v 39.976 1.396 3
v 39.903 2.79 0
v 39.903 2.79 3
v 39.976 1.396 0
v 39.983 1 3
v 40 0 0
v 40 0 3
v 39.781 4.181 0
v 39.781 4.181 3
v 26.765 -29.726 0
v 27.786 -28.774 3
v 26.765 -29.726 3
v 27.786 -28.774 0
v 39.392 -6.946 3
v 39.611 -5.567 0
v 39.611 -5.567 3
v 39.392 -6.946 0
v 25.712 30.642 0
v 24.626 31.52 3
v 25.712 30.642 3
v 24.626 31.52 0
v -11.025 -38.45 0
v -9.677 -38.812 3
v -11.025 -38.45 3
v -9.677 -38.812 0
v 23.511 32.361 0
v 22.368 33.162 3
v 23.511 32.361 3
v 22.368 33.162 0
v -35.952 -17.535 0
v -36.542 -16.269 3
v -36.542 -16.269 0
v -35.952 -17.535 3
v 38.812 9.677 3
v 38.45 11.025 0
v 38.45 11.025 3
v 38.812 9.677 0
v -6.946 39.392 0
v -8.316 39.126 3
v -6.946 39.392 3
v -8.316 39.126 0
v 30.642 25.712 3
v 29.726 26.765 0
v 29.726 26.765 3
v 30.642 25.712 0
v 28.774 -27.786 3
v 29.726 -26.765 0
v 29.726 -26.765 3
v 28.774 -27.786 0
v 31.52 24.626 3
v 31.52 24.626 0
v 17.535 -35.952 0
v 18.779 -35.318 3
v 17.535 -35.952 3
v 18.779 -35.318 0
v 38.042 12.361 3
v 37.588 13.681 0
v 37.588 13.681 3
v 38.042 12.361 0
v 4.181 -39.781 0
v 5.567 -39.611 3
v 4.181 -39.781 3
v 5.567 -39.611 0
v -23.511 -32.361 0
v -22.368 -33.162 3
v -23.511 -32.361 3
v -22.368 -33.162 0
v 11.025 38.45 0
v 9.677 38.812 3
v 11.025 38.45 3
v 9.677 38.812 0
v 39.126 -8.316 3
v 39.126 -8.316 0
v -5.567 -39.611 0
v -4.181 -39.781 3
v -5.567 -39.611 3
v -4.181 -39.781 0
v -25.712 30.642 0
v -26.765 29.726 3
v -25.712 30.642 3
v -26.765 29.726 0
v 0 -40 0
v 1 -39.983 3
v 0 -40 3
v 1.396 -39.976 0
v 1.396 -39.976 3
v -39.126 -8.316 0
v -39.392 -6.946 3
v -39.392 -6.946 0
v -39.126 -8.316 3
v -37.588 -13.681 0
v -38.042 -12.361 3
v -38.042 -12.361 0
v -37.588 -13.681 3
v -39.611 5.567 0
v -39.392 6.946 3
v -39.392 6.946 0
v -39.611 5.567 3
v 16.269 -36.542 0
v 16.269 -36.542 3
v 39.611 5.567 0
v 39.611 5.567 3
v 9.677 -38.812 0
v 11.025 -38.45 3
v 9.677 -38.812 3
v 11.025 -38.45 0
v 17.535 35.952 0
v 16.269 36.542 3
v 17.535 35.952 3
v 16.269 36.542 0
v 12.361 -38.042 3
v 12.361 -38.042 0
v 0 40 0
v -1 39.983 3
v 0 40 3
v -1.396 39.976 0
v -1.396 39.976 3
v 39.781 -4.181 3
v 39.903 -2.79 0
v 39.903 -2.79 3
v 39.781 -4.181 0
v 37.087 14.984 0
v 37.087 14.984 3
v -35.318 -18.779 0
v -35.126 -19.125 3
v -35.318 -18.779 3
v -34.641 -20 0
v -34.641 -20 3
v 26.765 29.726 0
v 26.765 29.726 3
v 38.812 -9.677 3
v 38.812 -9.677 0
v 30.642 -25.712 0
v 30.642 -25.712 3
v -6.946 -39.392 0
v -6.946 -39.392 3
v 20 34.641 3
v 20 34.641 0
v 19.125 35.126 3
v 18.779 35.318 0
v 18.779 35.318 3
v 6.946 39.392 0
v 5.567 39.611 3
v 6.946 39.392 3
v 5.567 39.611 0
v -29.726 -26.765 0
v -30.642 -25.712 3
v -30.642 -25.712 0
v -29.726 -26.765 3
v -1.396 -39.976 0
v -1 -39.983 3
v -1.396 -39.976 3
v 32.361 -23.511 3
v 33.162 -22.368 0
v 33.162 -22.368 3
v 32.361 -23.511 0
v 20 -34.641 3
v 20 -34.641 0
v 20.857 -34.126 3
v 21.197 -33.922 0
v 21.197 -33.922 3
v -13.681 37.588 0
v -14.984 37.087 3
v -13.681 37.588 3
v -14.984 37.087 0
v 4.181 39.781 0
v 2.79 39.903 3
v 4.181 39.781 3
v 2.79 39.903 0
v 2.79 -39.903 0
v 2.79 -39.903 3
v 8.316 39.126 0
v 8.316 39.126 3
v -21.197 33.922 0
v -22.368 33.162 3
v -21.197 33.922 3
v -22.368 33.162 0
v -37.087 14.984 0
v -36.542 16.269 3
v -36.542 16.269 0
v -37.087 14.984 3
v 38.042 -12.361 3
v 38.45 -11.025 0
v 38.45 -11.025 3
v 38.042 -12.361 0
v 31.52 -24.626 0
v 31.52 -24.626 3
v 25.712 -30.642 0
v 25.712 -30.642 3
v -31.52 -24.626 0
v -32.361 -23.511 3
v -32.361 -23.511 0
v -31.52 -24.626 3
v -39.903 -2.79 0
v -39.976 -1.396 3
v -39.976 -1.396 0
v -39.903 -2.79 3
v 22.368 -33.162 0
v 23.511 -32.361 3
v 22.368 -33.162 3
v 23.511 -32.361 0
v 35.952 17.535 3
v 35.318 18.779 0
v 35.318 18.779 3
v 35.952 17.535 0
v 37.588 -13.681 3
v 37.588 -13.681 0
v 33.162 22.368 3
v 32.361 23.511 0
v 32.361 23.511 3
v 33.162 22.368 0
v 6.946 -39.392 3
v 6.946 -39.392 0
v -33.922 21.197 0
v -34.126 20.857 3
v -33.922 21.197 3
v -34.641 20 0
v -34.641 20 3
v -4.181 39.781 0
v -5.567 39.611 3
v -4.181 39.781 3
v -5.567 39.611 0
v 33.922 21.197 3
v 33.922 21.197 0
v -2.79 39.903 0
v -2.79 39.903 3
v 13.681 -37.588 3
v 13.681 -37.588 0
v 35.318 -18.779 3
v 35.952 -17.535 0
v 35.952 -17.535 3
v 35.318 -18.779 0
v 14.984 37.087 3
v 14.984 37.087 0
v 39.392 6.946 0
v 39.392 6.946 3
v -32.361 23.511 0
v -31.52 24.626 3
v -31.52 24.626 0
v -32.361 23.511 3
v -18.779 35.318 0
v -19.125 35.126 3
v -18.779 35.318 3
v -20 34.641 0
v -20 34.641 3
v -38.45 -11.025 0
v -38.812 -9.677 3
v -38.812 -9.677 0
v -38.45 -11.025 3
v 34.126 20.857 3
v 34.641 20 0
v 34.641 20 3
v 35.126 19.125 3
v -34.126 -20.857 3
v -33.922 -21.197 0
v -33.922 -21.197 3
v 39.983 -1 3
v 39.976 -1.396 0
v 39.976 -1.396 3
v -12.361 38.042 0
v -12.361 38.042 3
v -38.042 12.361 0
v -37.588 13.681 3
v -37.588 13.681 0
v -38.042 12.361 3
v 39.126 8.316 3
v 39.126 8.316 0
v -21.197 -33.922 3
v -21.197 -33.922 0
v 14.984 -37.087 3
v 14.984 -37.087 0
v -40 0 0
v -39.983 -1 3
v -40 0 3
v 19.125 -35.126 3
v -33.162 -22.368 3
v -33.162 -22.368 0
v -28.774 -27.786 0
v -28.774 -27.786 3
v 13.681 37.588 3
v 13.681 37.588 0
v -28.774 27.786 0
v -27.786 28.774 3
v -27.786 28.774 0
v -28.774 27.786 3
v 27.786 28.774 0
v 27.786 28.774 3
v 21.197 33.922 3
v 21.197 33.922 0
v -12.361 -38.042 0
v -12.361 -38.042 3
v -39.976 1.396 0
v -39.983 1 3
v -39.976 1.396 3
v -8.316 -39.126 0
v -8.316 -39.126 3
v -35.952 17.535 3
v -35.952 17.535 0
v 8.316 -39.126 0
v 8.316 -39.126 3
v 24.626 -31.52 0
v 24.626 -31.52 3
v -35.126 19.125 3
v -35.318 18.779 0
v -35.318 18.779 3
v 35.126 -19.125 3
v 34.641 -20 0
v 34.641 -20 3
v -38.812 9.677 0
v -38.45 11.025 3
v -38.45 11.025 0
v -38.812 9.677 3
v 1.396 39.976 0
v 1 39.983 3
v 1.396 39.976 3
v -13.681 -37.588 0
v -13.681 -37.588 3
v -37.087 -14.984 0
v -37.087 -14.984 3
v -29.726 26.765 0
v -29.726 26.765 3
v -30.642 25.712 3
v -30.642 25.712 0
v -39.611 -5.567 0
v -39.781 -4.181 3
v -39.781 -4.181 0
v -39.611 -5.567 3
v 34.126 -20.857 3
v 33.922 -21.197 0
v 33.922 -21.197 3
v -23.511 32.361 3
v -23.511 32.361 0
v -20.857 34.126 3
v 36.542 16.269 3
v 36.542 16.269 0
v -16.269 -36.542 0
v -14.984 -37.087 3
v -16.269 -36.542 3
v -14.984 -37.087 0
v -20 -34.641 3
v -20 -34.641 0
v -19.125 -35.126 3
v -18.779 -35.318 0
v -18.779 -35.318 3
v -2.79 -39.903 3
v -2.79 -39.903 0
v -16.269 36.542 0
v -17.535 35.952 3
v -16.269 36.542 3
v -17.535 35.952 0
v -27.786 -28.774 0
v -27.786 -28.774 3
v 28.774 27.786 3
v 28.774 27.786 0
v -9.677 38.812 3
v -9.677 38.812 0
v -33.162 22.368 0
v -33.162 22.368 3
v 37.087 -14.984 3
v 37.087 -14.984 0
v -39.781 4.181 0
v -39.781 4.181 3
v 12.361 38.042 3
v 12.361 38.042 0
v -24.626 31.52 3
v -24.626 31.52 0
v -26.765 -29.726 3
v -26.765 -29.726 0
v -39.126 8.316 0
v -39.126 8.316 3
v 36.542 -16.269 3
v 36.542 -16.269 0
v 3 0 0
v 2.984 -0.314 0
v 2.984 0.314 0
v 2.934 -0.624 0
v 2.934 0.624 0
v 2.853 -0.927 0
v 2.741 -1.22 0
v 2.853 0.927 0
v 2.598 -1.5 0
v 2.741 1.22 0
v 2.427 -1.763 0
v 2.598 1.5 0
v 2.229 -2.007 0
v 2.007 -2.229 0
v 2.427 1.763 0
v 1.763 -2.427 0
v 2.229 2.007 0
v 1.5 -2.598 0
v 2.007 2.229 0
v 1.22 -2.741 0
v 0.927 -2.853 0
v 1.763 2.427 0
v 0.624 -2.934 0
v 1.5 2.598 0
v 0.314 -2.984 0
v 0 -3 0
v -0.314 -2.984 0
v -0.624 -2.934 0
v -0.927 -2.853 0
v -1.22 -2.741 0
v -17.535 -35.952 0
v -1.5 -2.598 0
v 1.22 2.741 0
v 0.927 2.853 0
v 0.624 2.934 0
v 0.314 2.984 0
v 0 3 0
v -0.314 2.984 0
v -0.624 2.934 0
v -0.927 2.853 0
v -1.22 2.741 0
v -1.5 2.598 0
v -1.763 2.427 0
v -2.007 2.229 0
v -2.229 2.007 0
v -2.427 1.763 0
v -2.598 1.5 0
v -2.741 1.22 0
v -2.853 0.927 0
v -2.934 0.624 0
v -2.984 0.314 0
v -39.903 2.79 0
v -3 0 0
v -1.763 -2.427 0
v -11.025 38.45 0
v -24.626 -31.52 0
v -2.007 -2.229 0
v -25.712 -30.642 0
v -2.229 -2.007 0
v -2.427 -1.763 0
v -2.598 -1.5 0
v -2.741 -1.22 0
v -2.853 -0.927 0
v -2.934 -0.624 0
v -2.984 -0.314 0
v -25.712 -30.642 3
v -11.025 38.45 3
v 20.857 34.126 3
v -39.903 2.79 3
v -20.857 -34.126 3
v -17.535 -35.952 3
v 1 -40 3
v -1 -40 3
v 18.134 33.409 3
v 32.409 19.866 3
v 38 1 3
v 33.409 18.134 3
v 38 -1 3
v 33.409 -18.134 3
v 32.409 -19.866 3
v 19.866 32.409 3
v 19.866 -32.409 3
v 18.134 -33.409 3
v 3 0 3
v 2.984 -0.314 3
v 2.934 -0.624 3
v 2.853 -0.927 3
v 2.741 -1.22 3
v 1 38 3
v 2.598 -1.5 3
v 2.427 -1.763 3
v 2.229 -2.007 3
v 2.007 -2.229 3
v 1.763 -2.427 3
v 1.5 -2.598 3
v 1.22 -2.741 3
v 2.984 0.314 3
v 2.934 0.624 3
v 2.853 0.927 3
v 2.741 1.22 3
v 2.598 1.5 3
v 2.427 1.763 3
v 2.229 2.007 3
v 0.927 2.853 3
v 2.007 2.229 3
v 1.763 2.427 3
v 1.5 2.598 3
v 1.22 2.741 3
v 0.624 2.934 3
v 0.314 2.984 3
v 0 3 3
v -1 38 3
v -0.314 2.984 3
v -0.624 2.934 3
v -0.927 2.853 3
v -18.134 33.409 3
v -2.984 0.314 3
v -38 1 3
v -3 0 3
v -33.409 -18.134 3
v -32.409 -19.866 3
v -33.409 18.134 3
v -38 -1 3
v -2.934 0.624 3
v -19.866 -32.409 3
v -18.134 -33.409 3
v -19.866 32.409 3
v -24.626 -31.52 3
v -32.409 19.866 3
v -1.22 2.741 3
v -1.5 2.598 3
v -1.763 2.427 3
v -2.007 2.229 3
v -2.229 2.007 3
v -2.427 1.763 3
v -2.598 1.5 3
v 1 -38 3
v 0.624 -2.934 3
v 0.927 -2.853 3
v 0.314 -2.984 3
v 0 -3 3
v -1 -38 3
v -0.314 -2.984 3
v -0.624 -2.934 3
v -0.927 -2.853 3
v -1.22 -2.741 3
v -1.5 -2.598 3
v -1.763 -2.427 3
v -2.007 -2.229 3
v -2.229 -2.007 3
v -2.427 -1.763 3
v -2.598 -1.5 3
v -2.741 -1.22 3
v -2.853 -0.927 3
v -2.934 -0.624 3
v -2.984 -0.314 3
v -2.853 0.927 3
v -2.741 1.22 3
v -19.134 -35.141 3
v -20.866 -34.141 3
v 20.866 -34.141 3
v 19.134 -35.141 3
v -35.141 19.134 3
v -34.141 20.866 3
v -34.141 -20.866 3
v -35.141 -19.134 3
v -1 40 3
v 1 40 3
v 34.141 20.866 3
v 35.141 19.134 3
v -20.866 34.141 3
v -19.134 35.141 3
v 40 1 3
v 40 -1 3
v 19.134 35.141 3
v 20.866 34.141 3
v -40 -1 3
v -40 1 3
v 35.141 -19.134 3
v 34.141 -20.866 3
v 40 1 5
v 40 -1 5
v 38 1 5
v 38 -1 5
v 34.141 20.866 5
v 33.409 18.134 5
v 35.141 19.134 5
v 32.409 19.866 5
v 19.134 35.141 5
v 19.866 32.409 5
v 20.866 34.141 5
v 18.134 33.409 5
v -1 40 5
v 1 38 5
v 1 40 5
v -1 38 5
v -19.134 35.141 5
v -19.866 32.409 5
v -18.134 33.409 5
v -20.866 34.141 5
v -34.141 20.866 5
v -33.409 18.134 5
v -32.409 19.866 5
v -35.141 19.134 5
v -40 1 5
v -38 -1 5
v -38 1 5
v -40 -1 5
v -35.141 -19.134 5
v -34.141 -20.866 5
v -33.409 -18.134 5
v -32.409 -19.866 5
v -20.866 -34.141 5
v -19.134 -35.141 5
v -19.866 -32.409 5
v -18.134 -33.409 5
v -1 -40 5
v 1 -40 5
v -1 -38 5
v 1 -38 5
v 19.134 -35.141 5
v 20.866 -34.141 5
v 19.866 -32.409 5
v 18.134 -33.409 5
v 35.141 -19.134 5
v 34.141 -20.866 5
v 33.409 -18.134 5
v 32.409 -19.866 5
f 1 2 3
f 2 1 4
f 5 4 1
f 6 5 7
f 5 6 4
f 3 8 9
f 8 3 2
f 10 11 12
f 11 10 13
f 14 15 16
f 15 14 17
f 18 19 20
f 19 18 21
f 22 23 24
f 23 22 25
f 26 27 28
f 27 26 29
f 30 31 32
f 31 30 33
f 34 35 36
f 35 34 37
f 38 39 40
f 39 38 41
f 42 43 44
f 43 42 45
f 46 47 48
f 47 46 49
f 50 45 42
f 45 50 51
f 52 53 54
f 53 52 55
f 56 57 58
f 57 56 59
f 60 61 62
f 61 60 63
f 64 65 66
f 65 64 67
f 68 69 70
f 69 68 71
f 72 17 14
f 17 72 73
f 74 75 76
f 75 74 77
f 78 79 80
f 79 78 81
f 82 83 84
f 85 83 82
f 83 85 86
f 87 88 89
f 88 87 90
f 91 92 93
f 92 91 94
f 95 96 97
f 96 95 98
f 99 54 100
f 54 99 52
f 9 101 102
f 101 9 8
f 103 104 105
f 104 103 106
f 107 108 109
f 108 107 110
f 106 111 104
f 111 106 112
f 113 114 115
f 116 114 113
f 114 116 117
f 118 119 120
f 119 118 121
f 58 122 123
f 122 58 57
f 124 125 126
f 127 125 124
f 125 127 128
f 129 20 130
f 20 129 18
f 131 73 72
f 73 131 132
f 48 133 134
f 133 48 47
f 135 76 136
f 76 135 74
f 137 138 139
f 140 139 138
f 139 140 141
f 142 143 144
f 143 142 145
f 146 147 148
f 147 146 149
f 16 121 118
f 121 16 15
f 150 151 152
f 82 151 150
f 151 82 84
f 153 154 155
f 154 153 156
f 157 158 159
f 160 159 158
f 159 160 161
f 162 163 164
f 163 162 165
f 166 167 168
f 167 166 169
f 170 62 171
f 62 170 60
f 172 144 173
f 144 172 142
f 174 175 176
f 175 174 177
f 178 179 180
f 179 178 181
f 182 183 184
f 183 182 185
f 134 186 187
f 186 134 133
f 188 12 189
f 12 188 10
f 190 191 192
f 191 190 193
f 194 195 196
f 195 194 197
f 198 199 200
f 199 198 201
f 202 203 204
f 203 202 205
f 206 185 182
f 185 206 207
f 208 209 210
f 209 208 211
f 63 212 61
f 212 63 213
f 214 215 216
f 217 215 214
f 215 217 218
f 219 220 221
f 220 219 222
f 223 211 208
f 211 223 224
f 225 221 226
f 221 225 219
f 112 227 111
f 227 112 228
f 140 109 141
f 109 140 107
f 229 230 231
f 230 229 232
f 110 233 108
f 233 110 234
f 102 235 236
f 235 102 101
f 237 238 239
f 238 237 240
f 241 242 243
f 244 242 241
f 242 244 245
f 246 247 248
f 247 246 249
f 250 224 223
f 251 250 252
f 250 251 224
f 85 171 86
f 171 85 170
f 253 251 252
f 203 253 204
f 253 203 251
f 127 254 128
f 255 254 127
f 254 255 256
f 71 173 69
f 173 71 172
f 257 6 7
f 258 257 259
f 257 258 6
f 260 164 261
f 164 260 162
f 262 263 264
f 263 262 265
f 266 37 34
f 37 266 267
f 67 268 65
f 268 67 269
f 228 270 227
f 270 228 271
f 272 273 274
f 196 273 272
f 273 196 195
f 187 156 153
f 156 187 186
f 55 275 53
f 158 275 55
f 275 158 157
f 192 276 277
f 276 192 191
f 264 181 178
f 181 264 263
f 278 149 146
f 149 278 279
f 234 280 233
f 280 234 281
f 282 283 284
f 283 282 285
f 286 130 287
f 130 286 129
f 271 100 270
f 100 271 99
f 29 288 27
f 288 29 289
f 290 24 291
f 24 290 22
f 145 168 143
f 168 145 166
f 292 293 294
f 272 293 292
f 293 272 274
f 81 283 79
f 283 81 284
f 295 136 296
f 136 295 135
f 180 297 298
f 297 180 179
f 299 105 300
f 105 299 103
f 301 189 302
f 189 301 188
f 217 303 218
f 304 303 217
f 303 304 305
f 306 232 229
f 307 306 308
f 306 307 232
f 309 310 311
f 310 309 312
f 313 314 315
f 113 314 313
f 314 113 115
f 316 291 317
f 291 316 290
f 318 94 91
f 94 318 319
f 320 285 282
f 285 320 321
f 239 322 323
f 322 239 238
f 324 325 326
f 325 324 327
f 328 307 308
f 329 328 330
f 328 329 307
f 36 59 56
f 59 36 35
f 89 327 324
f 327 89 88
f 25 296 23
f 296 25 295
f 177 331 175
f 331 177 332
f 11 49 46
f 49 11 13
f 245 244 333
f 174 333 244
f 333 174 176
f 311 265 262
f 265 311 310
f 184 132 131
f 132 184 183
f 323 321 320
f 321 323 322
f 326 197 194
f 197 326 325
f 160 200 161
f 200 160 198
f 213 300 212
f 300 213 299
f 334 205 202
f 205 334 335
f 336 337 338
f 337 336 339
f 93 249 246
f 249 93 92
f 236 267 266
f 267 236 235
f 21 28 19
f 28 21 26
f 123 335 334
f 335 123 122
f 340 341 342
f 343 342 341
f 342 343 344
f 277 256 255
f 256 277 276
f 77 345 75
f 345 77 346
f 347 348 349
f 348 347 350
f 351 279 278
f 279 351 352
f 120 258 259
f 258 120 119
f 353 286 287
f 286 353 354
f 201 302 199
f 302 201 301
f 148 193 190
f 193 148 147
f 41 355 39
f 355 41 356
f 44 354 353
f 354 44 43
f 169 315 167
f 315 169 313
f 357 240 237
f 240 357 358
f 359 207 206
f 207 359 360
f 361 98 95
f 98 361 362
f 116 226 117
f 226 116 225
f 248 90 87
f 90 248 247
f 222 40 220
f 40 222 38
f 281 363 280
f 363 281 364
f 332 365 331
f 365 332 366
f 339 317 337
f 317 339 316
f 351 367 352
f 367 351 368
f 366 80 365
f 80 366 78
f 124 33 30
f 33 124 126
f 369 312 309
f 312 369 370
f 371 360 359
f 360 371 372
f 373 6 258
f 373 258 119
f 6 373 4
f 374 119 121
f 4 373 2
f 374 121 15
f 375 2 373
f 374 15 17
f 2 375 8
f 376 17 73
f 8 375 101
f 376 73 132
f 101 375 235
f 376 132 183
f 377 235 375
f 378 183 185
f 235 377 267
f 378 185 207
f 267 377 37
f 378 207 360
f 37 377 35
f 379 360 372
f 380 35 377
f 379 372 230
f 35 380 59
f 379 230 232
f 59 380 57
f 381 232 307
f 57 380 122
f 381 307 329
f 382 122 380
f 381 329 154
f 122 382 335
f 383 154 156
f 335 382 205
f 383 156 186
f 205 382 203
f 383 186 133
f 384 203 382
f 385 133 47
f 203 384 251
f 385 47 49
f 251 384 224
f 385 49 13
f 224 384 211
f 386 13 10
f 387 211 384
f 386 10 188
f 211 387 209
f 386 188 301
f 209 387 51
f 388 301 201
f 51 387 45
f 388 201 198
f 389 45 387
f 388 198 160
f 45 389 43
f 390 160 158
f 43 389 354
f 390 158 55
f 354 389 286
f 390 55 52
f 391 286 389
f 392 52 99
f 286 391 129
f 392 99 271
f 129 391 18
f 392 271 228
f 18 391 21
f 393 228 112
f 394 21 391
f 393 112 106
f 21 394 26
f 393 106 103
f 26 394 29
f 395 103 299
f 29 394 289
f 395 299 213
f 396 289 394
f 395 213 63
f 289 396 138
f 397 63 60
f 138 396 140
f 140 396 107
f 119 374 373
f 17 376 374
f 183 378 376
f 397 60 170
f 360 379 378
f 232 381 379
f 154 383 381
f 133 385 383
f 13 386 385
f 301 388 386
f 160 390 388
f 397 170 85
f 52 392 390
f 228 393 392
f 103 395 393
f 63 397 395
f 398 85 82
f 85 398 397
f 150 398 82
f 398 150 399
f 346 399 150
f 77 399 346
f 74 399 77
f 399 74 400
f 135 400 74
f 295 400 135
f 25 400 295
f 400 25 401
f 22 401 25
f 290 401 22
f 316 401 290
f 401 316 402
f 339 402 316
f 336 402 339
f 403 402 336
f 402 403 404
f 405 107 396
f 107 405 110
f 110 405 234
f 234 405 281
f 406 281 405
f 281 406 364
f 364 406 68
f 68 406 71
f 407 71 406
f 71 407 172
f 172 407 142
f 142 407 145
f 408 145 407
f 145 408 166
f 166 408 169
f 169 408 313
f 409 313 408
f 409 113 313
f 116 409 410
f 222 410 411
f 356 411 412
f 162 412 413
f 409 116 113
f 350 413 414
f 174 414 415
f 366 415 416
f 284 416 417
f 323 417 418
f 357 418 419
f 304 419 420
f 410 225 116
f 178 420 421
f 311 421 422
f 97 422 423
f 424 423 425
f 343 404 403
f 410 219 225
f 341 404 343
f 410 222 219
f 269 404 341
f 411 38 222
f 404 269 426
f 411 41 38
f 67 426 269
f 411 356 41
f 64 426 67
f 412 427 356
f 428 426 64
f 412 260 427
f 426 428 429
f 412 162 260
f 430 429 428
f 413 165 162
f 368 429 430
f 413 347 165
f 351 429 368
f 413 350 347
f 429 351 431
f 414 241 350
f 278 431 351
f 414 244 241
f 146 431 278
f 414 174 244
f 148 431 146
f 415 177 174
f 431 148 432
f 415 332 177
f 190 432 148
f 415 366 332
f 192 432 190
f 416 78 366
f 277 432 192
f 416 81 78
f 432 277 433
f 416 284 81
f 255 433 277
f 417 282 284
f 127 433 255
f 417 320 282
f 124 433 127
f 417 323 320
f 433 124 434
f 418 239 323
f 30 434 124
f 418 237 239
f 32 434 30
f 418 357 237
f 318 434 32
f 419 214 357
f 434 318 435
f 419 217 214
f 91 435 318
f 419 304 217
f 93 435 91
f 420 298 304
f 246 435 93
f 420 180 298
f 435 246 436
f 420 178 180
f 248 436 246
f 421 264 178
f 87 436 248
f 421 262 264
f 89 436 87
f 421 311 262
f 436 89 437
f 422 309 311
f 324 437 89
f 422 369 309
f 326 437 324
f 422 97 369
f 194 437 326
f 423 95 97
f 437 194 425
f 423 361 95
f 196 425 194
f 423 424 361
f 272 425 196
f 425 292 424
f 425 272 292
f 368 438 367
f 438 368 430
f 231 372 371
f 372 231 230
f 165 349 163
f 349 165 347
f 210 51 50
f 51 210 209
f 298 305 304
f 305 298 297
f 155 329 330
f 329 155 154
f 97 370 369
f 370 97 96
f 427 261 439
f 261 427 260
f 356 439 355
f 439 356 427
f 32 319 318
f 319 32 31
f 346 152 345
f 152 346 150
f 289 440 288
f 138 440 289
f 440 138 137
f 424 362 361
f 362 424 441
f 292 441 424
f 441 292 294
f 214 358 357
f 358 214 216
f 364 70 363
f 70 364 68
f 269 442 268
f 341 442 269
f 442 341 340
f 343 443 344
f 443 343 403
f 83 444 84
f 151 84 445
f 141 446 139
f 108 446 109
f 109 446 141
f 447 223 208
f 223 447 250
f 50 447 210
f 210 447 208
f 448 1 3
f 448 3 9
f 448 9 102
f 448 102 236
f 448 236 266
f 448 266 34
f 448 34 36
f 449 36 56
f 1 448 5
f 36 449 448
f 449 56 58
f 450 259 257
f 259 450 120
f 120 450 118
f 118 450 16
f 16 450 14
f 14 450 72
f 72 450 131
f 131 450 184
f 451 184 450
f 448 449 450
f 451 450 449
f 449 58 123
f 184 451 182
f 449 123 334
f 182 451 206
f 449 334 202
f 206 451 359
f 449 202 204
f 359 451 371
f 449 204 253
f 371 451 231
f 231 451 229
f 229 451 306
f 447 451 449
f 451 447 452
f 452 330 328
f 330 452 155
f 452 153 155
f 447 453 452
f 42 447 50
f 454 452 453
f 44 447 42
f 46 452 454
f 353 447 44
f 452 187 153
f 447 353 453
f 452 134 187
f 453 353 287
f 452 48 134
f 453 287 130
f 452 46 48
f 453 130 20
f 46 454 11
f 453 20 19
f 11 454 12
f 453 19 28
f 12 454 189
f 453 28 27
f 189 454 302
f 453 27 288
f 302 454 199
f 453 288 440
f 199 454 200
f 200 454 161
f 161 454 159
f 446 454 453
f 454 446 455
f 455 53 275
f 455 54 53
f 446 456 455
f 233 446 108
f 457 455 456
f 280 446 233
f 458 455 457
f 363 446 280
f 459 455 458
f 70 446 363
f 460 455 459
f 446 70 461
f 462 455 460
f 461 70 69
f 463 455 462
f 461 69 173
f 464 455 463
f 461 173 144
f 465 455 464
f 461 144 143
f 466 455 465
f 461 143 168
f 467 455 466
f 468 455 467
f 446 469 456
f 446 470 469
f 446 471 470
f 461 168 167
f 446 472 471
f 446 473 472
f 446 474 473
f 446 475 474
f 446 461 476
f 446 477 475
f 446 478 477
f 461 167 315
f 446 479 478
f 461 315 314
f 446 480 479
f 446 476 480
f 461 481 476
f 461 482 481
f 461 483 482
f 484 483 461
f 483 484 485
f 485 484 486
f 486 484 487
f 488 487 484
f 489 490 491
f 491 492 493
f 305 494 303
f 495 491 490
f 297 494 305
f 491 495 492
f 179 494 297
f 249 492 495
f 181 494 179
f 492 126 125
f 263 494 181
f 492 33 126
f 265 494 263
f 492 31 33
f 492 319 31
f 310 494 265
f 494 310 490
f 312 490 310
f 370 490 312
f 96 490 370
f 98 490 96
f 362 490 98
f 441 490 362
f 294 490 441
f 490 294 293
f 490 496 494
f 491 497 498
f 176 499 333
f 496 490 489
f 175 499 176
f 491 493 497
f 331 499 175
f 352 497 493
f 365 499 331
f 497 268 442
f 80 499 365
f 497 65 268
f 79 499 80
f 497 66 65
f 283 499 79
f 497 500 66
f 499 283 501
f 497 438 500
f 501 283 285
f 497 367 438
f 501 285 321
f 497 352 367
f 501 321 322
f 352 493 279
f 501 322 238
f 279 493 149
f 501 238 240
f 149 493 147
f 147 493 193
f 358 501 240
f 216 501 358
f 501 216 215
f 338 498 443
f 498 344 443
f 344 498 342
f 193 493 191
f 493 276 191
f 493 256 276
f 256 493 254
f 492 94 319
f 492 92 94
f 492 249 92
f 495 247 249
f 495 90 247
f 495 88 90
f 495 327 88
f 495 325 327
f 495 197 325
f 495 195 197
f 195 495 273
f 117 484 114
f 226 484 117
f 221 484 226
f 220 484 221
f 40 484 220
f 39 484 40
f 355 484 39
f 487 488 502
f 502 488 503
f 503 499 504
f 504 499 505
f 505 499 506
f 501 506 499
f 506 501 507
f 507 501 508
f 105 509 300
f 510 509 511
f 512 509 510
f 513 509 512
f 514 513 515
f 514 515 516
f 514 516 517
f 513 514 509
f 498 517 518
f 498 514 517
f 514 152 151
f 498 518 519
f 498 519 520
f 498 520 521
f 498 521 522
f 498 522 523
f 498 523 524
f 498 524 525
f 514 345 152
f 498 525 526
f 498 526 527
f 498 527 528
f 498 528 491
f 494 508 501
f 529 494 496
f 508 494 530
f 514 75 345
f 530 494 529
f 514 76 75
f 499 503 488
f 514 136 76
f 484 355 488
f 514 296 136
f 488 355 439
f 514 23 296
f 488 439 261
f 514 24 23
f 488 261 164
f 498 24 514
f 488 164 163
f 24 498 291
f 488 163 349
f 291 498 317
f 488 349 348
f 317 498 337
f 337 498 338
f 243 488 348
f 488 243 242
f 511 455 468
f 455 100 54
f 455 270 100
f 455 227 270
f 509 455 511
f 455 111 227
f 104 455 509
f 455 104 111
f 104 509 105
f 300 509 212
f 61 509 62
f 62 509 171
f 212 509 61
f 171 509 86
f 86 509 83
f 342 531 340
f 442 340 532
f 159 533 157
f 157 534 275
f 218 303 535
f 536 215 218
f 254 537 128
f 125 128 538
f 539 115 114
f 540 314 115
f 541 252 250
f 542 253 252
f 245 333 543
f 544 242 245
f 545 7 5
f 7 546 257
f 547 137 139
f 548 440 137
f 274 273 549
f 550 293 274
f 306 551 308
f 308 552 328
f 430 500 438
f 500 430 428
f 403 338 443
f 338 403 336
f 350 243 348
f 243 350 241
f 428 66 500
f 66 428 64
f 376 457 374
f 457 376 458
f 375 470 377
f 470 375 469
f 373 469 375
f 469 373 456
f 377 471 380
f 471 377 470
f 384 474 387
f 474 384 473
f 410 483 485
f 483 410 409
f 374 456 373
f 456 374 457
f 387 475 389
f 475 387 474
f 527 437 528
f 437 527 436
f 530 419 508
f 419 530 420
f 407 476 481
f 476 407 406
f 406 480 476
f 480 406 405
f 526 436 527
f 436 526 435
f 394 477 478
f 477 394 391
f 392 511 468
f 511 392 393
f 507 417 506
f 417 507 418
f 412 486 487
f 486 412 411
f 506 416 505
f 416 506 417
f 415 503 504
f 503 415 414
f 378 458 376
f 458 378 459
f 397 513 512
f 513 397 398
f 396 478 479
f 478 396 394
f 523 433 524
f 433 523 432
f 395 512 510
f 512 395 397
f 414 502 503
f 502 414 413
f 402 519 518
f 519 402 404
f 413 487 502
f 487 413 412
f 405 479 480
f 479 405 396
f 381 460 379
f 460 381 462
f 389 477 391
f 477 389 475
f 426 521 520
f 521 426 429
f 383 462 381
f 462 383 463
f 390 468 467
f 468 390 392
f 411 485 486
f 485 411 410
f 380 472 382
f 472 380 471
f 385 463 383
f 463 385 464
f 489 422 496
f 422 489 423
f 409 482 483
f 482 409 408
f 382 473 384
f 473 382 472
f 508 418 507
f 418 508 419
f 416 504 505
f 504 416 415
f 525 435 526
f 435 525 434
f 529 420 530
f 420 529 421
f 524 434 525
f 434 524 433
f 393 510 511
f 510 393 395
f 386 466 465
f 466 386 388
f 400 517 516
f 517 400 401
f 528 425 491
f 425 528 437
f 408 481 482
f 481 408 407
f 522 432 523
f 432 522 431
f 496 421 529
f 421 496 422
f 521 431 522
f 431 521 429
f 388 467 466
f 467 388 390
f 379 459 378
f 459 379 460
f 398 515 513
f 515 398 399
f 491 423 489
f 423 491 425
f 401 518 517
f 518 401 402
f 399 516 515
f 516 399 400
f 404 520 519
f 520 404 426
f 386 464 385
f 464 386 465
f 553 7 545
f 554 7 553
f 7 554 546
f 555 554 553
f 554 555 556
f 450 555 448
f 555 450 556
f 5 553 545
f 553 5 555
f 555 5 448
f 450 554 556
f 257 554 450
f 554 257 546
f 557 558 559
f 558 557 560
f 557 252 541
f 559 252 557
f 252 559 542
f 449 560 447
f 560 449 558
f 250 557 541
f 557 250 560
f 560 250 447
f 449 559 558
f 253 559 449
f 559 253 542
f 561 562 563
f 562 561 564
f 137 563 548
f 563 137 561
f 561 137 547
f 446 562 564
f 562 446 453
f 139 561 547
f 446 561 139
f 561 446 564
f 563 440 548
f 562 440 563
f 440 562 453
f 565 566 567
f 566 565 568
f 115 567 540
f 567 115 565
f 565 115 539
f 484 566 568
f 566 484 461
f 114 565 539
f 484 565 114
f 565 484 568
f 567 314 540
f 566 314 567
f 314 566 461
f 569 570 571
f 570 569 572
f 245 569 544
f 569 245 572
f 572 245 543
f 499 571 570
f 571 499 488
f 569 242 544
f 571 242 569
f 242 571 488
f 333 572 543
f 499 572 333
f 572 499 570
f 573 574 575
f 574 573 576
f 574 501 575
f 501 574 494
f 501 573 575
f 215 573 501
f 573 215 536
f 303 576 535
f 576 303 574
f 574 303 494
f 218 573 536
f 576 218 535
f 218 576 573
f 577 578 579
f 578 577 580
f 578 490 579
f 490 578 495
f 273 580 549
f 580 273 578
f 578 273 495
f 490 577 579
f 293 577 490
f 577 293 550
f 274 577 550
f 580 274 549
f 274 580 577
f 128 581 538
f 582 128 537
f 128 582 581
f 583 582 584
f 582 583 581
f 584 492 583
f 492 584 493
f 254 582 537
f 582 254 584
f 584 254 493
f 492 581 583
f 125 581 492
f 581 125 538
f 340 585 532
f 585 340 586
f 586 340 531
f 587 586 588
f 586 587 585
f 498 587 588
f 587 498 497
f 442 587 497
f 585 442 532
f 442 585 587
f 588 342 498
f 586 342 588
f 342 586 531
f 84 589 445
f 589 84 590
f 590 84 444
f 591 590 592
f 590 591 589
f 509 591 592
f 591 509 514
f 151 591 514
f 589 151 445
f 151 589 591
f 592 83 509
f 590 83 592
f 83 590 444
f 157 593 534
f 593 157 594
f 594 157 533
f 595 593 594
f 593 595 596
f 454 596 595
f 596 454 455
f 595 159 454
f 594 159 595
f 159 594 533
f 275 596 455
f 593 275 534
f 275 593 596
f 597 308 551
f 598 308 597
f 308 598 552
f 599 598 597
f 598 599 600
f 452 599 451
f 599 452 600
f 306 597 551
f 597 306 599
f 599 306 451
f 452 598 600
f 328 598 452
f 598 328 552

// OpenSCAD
r = 40; th = 3; $fn=180;
difference(){ cylinder(h=th, r=r); translate([0,0,-1]) cylinder(h=th+2, r=3, $fn=60); }
for(i=[0:11]) rotate([0,0,i*30]) translate([r-2, -1, th]) cube([2, 2, 2]);
